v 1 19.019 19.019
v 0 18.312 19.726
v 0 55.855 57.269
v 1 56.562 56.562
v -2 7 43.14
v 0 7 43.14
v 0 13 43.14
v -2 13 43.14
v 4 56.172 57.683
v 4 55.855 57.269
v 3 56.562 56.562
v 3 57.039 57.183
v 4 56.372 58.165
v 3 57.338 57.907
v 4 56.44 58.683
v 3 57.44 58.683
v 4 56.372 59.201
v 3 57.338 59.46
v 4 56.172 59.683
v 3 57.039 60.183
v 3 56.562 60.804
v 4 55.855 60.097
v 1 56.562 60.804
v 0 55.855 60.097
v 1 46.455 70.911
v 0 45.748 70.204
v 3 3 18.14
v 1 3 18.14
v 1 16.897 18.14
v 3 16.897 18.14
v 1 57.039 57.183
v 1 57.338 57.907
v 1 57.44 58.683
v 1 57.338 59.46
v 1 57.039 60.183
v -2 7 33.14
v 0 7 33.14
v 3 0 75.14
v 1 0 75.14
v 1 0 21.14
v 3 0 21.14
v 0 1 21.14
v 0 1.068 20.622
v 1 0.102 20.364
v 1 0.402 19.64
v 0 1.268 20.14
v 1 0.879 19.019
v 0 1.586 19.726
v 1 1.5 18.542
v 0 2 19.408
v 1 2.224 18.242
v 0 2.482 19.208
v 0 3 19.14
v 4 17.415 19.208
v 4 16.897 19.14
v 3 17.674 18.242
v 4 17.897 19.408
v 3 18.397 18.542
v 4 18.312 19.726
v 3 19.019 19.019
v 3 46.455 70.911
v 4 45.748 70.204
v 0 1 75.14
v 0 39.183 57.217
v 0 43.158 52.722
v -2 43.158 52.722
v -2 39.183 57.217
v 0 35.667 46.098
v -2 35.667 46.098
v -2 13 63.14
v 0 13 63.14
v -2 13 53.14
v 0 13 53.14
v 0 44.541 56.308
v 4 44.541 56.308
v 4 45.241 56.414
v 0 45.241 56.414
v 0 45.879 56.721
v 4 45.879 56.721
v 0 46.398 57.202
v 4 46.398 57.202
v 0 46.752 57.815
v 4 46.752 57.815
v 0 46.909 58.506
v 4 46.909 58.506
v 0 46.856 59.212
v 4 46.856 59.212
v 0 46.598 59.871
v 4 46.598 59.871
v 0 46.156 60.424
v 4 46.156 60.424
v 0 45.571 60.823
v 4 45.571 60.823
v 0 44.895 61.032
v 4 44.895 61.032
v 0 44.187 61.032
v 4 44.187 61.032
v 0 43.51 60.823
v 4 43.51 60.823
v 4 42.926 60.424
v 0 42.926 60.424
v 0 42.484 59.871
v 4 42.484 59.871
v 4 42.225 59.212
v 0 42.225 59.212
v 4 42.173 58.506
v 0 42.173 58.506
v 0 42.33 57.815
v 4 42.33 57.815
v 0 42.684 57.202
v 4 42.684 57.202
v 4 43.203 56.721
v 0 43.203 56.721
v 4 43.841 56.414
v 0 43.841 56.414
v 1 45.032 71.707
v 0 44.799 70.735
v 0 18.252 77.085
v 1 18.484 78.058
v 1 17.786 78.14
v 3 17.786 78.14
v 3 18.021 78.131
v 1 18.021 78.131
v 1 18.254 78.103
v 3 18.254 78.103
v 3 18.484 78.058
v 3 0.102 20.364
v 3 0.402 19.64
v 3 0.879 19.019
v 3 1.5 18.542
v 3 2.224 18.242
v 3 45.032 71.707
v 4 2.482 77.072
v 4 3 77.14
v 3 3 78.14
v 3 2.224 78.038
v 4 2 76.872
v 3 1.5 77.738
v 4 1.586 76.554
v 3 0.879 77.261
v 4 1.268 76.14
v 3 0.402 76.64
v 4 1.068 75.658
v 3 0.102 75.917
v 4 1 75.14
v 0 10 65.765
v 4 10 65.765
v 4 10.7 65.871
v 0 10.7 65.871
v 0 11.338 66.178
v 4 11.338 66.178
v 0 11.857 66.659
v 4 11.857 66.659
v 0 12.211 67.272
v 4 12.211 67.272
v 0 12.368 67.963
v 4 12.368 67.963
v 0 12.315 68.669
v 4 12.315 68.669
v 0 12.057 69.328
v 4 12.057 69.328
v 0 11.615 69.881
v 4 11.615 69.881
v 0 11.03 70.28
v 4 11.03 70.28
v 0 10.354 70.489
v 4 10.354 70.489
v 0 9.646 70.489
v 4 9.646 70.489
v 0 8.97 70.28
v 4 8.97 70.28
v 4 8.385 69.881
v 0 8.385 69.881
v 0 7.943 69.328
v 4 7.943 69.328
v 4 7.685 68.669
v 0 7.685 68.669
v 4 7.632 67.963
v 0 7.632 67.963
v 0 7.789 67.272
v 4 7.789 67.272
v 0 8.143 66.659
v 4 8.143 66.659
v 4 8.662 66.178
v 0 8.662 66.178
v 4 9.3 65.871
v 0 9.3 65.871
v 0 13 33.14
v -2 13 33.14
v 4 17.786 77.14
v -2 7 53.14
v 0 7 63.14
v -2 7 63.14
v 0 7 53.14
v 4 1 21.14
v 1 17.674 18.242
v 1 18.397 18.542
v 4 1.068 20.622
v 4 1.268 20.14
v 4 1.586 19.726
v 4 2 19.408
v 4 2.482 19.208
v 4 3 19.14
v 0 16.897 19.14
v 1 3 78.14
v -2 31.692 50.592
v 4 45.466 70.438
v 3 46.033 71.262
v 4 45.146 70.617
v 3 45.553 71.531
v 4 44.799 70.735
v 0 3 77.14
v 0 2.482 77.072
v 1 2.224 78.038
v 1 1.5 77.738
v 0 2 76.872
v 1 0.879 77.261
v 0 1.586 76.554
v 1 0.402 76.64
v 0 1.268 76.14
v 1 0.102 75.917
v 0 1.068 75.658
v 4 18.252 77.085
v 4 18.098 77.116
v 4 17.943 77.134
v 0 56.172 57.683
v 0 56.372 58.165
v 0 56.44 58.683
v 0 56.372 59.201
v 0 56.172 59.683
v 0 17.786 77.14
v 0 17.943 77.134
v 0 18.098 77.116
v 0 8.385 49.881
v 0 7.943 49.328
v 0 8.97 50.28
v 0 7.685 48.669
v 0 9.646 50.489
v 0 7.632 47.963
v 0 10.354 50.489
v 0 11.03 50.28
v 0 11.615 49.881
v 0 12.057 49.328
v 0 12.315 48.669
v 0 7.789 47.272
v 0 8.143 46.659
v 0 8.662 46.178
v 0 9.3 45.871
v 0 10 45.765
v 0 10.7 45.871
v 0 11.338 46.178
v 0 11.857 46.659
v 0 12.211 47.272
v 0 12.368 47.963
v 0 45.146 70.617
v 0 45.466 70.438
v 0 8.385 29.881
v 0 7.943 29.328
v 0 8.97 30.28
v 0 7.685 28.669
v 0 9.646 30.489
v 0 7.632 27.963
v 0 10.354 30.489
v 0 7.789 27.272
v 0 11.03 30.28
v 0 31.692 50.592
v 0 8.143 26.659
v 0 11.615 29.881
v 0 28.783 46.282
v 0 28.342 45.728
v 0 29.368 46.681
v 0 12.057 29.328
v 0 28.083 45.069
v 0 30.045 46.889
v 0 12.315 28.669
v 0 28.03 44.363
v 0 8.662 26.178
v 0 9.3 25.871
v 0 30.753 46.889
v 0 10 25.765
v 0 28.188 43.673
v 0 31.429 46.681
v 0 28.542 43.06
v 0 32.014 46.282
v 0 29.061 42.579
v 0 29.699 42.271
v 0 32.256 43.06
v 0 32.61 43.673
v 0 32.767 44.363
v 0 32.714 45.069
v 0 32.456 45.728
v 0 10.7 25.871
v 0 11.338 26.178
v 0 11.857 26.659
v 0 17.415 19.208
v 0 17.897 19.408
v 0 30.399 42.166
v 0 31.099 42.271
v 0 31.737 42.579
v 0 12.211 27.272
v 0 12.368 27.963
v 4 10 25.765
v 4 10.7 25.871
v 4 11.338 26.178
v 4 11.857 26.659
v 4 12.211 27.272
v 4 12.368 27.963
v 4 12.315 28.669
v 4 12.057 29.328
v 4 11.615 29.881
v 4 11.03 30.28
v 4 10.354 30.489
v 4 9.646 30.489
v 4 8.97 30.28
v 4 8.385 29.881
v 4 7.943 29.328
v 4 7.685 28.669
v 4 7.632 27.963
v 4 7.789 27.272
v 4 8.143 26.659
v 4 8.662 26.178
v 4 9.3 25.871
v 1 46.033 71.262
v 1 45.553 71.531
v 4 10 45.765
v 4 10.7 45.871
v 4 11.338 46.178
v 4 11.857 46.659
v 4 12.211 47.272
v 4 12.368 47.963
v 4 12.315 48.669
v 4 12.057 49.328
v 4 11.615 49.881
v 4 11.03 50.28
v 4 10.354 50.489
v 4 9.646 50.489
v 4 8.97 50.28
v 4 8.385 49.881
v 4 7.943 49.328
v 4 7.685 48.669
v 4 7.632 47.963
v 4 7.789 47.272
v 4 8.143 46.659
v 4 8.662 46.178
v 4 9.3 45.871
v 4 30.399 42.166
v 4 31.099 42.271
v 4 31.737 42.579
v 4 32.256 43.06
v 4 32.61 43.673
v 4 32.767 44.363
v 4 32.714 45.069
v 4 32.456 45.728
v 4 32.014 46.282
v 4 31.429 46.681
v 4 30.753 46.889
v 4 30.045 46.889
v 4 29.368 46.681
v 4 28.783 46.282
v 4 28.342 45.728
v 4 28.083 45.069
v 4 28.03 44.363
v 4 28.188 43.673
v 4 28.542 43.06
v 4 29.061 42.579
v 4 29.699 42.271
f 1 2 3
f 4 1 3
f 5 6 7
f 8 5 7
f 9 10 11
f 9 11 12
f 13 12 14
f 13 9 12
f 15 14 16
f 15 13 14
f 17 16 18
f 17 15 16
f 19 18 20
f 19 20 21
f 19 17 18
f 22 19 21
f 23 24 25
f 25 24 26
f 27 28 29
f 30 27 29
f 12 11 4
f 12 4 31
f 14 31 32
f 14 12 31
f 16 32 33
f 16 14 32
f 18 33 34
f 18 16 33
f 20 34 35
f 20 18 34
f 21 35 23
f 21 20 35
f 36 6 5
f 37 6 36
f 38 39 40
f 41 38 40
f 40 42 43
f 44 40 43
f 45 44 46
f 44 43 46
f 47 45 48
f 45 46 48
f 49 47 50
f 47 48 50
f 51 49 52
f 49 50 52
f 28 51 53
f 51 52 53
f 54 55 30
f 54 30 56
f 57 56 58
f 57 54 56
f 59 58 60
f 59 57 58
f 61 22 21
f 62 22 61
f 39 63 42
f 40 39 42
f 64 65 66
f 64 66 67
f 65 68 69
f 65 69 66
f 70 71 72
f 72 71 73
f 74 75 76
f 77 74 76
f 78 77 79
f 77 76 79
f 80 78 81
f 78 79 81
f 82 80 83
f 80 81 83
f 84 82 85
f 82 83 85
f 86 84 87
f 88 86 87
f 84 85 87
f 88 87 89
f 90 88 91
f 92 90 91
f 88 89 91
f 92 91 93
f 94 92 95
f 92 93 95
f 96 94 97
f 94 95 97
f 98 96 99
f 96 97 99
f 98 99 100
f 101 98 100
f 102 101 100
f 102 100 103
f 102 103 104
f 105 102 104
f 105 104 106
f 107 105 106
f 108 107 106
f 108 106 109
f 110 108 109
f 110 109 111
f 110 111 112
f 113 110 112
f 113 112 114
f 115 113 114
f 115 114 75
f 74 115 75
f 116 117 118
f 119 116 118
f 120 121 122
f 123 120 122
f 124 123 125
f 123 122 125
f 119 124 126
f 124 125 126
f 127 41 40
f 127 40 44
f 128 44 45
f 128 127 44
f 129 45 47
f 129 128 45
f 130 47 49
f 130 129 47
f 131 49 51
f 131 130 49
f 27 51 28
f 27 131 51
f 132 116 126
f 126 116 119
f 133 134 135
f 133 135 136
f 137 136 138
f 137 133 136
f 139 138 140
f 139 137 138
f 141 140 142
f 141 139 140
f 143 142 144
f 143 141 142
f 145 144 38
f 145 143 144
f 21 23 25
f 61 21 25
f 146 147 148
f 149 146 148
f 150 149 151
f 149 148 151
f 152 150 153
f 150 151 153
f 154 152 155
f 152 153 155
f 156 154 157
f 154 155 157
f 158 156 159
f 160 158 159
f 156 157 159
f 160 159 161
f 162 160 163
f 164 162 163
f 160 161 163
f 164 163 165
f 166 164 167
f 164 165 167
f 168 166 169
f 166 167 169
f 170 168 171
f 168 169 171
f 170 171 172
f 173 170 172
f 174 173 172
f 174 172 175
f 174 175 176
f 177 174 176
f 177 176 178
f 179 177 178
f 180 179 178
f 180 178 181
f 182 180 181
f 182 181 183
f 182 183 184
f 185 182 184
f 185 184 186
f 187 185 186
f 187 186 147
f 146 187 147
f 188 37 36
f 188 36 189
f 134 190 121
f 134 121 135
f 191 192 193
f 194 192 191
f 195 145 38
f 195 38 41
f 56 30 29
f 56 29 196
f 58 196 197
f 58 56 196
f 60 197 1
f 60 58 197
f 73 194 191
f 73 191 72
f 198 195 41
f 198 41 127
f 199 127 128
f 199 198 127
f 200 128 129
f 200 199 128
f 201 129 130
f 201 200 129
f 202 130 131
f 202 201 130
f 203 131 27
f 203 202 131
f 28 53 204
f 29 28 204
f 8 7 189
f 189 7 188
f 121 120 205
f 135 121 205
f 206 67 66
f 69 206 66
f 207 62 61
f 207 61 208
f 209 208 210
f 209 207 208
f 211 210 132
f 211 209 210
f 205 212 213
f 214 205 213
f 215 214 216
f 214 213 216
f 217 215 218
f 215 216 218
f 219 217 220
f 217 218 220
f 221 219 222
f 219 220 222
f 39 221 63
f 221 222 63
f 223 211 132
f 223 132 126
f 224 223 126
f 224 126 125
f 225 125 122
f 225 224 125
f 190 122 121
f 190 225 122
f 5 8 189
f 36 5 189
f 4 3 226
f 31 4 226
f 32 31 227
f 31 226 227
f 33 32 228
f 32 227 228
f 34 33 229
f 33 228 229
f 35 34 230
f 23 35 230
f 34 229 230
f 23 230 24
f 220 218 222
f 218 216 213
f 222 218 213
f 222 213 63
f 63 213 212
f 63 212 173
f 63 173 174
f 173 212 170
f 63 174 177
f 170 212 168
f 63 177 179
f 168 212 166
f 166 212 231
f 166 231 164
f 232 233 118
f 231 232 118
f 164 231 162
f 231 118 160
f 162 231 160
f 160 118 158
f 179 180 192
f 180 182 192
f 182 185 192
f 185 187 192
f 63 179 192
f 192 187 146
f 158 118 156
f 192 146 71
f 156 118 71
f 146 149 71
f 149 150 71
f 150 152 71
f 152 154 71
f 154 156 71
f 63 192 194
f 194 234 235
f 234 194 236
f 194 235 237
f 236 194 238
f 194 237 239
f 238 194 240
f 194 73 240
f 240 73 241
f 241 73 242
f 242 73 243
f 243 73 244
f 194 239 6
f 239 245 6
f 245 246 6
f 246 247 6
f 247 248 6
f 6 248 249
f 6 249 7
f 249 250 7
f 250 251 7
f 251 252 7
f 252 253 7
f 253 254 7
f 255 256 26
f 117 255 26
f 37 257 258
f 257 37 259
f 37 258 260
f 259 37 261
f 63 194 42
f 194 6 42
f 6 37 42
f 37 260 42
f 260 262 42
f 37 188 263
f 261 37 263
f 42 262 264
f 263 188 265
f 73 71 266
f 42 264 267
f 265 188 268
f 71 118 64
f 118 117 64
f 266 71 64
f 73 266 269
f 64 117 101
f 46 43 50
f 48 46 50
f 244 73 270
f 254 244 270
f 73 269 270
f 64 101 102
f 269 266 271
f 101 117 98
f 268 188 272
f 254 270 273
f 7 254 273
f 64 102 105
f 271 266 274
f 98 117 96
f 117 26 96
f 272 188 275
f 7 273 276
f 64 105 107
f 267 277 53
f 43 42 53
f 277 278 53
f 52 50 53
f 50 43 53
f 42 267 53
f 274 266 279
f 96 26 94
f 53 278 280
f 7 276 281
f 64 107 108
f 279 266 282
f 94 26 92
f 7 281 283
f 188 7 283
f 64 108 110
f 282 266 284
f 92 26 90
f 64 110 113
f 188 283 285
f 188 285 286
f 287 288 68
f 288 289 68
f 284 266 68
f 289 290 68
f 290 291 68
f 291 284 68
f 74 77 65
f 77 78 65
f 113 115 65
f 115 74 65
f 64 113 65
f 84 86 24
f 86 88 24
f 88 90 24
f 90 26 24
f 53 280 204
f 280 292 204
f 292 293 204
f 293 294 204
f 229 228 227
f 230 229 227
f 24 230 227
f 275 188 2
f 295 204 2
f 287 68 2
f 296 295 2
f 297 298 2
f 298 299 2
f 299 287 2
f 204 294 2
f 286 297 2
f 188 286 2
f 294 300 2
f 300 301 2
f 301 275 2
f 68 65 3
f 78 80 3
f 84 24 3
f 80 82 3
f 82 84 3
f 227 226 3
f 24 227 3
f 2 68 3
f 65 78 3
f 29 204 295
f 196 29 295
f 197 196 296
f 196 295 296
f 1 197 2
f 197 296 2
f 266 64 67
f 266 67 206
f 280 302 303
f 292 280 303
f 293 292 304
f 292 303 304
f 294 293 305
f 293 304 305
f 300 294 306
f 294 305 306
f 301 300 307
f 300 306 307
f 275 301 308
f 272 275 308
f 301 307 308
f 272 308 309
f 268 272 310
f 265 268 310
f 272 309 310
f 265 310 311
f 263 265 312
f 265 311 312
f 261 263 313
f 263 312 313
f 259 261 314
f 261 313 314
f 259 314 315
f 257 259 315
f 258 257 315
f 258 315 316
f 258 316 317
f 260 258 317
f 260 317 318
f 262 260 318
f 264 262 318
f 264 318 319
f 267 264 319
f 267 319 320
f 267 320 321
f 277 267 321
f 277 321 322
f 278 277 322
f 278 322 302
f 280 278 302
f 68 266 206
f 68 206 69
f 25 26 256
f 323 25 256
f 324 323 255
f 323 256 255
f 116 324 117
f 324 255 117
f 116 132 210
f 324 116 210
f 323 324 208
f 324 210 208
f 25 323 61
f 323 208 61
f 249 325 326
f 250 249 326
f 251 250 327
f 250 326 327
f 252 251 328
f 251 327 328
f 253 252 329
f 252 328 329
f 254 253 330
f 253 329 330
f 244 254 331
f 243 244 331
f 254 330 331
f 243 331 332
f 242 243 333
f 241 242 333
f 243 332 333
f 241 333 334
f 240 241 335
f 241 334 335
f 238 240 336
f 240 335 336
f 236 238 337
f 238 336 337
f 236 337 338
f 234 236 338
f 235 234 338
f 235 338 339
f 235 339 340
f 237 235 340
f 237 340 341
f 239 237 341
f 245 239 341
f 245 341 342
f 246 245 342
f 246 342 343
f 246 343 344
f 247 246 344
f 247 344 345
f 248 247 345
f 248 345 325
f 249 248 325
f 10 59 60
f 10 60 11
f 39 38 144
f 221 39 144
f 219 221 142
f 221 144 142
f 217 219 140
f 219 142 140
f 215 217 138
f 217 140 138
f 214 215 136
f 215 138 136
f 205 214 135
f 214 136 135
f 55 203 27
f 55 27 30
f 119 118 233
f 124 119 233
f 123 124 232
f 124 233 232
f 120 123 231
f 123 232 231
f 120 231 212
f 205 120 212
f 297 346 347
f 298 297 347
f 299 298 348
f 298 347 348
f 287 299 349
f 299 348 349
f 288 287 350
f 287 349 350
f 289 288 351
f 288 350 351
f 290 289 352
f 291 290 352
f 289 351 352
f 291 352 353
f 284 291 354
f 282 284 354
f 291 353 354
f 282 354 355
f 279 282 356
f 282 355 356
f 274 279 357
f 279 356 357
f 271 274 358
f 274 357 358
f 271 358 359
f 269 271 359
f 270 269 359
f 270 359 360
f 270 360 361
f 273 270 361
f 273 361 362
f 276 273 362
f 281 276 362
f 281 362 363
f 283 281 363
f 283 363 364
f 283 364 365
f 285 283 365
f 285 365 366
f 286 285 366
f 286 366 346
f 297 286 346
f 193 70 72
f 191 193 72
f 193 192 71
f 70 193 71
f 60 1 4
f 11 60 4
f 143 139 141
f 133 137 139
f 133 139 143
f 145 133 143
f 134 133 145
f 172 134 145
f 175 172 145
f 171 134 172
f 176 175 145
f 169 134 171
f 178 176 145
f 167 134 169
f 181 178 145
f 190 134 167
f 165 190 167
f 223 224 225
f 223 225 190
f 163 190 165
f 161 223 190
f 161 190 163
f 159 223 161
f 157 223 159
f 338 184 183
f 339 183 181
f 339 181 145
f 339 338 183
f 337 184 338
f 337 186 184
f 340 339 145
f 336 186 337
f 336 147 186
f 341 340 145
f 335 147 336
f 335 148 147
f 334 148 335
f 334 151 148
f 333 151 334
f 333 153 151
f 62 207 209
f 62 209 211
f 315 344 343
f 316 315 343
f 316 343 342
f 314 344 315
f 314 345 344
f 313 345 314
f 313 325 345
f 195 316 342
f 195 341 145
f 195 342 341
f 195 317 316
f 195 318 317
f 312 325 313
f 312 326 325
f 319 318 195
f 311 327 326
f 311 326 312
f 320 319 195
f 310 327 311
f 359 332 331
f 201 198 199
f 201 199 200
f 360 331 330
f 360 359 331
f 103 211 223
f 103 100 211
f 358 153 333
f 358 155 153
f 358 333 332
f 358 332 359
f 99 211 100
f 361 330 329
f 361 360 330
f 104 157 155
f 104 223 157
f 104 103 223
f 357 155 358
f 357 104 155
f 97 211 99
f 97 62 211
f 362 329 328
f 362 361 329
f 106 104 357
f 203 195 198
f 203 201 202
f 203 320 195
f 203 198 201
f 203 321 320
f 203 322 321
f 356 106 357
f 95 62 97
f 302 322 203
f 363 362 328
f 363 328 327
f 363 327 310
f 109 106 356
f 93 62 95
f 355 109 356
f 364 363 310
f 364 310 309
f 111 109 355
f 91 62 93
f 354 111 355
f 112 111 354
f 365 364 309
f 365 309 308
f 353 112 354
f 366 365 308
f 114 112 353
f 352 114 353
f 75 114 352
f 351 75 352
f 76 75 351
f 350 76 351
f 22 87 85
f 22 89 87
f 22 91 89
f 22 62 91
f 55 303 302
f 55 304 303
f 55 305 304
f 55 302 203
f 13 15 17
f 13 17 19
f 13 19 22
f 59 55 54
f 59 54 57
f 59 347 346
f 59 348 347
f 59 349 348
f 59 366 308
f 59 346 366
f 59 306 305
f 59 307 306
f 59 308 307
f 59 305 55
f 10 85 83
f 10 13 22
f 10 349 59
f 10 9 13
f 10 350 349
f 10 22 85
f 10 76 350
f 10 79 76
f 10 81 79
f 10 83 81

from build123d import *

# Parameters (mm, degrees)
BOSS_EXTRUDE1_DEPTH      = 4
SKETCH2_R                = 2.375
CUT_EXTRUDE1_DEPTH       = 5
LPATTERN1_COUNT          = 3
LPATTERN1_PITCH          = 20
SKETCH2_4_R              = 2.375
CUT_EXTRUDE2_DEPTH       = 5
LPATTERN2_COUNT          = 2
LPATTERN2_PITCH          = 20
FILLET1_R                = 3
CHANFRO1_SIZE            = 1
RESSALTO_EXTRUS_O1_START = -4
ESBO_O1_W                = 10
ESBO_O1_H                = 6
RESSALTO_EXTRUS_O1_DEPTH = 2


with BuildPart() as part:
    # Sketch1 → Boss-Extrude1 (new body)
    with BuildSketch(Plane(origin=(0, 0, 0), x_dir=(0, 0, -1), z_dir=(1, 0, 0))):
        Polygon((-78.140120378, 0), (-18.140120378, 0), (-18.140120378, 18.140120378), (-58.68306962, 58.68306962), (-71.510071751, 45.856067489), (-78.140120378, 18.140120378), align=None)
    extrude(amount=BOSS_EXTRUDE1_DEPTH)

    # Sketch2 → Cut-Extrude1 (cut, through all)
    with BuildSketch(Plane(origin=(4, 0, 0), x_dir=(0, 0, -1), z_dir=(1, 0, 0))):
        with Locations((-28.140120378, 10)):
            Circle(SKETCH2_R)
    cut_extrude1 = extrude(amount=-CUT_EXTRUDE1_DEPTH, mode=Mode.SUBTRACT)

    # LPattern1: Cut-Extrude1 ×3
    with Locations(*[(0, 0, i * LPATTERN1_PITCH) for i in range(1, LPATTERN1_COUNT)]):
        add(cut_extrude1, mode=Mode.SUBTRACT)

    # Sketch2_4 → Cut-Extrude2 (cut, through all)
    with BuildSketch(Plane(origin=(4, 0, 0), x_dir=(0, 0, -1), z_dir=(1, 0, 0))):
        with Locations((-58.68306962, 44.540933996)):
            Circle(SKETCH2_4_R)
    cut_extrude2 = extrude(amount=-CUT_EXTRUDE2_DEPTH, mode=Mode.SUBTRACT)

    # LPattern2: Cut-Extrude2 ×2
    with Locations(*[Vector(0, -0.707106781, -0.707106781) * (i * LPATTERN2_PITCH) for i in range(1, LPATTERN2_COUNT)]):
        add(cut_extrude2, mode=Mode.SUBTRACT)

    # Fillet1
    fillet1_edges = [part.edges().sort_by_distance(p)[0] for p in [
        (2, 18.140120378, 78.140120378),
        (2, 45.856067489, 71.510071751),
        (2, 58.68306962, 58.68306962),
        (2, 18.140120378, 18.140120378),
        (2, 0, 18.140120378),
        (2, 0, 78.140120378),
    ]]
    fillet(fillet1_edges, radius=FILLET1_R)

    # Chanfro1
    chanfro1_edges = [part.edges().sort_by_distance(p)[0] for p in [
        (0, 0, 48.140120378),
        (4, 0, 48.140120378),
        (0, 10.393145239, 78.140120378),
        (0, 31.75807492, 74.882512025),
        (0, 51.508513622, 65.857625619),
        (0, 37.790274655, 37.790274655),
        (0, 9.948739845, 18.140120378),
        (0, 57.440428933, 58.68306962),
        (0, 18.045529988, 18.36848178),
        (0, 0.878679656, 19.018800034),
        (0, 45.798751214, 71.407627967),
        (0, 18.137684762, 78.119469645),
        (0, 0.878679656, 77.261440721),
        (4, 10.393145239, 78.140120378),
        (4, 9.948739845, 18.140120378),
        (4, 37.790274655, 37.790274655),
        (4, 51.508513622, 65.857625619),
        (4, 31.75807492, 74.882512025),
        (4, 57.440428933, 58.68306962),
        (4, 18.045529988, 18.36848178),
        (4, 0.878679656, 19.018800034),
        (4, 45.798751214, 71.407627967),
        (4, 18.137684762, 78.119469645),
        (4, 0.878679656, 77.261440721),
    ]]
    chamfer(chanfro1_edges, length=CHANFRO1_SIZE)

    # Esbo_o1 → Ressalto-extrus_o1 (add)
    with BuildSketch(Plane(origin=(4, 0, 0), x_dir=(0, 0, -1), z_dir=(1, 0, 0)).offset(RESSALTO_EXTRUS_O1_START)):
        Polygon((-57.21666665, 39.183379746), (-50.59244791, 31.692069708), (-46.097661887, 35.666600952), (-52.721880627, 43.15791099), align=None)
        with Locations((-58.140120378, 10)):
            Rectangle(ESBO_O1_W, ESBO_O1_H)
        with Locations((-38.140120378, 10)):
            Rectangle(ESBO_O1_W, ESBO_O1_H)
    extrude(amount=-RESSALTO_EXTRUS_O1_DEPTH)


solid = part.part
